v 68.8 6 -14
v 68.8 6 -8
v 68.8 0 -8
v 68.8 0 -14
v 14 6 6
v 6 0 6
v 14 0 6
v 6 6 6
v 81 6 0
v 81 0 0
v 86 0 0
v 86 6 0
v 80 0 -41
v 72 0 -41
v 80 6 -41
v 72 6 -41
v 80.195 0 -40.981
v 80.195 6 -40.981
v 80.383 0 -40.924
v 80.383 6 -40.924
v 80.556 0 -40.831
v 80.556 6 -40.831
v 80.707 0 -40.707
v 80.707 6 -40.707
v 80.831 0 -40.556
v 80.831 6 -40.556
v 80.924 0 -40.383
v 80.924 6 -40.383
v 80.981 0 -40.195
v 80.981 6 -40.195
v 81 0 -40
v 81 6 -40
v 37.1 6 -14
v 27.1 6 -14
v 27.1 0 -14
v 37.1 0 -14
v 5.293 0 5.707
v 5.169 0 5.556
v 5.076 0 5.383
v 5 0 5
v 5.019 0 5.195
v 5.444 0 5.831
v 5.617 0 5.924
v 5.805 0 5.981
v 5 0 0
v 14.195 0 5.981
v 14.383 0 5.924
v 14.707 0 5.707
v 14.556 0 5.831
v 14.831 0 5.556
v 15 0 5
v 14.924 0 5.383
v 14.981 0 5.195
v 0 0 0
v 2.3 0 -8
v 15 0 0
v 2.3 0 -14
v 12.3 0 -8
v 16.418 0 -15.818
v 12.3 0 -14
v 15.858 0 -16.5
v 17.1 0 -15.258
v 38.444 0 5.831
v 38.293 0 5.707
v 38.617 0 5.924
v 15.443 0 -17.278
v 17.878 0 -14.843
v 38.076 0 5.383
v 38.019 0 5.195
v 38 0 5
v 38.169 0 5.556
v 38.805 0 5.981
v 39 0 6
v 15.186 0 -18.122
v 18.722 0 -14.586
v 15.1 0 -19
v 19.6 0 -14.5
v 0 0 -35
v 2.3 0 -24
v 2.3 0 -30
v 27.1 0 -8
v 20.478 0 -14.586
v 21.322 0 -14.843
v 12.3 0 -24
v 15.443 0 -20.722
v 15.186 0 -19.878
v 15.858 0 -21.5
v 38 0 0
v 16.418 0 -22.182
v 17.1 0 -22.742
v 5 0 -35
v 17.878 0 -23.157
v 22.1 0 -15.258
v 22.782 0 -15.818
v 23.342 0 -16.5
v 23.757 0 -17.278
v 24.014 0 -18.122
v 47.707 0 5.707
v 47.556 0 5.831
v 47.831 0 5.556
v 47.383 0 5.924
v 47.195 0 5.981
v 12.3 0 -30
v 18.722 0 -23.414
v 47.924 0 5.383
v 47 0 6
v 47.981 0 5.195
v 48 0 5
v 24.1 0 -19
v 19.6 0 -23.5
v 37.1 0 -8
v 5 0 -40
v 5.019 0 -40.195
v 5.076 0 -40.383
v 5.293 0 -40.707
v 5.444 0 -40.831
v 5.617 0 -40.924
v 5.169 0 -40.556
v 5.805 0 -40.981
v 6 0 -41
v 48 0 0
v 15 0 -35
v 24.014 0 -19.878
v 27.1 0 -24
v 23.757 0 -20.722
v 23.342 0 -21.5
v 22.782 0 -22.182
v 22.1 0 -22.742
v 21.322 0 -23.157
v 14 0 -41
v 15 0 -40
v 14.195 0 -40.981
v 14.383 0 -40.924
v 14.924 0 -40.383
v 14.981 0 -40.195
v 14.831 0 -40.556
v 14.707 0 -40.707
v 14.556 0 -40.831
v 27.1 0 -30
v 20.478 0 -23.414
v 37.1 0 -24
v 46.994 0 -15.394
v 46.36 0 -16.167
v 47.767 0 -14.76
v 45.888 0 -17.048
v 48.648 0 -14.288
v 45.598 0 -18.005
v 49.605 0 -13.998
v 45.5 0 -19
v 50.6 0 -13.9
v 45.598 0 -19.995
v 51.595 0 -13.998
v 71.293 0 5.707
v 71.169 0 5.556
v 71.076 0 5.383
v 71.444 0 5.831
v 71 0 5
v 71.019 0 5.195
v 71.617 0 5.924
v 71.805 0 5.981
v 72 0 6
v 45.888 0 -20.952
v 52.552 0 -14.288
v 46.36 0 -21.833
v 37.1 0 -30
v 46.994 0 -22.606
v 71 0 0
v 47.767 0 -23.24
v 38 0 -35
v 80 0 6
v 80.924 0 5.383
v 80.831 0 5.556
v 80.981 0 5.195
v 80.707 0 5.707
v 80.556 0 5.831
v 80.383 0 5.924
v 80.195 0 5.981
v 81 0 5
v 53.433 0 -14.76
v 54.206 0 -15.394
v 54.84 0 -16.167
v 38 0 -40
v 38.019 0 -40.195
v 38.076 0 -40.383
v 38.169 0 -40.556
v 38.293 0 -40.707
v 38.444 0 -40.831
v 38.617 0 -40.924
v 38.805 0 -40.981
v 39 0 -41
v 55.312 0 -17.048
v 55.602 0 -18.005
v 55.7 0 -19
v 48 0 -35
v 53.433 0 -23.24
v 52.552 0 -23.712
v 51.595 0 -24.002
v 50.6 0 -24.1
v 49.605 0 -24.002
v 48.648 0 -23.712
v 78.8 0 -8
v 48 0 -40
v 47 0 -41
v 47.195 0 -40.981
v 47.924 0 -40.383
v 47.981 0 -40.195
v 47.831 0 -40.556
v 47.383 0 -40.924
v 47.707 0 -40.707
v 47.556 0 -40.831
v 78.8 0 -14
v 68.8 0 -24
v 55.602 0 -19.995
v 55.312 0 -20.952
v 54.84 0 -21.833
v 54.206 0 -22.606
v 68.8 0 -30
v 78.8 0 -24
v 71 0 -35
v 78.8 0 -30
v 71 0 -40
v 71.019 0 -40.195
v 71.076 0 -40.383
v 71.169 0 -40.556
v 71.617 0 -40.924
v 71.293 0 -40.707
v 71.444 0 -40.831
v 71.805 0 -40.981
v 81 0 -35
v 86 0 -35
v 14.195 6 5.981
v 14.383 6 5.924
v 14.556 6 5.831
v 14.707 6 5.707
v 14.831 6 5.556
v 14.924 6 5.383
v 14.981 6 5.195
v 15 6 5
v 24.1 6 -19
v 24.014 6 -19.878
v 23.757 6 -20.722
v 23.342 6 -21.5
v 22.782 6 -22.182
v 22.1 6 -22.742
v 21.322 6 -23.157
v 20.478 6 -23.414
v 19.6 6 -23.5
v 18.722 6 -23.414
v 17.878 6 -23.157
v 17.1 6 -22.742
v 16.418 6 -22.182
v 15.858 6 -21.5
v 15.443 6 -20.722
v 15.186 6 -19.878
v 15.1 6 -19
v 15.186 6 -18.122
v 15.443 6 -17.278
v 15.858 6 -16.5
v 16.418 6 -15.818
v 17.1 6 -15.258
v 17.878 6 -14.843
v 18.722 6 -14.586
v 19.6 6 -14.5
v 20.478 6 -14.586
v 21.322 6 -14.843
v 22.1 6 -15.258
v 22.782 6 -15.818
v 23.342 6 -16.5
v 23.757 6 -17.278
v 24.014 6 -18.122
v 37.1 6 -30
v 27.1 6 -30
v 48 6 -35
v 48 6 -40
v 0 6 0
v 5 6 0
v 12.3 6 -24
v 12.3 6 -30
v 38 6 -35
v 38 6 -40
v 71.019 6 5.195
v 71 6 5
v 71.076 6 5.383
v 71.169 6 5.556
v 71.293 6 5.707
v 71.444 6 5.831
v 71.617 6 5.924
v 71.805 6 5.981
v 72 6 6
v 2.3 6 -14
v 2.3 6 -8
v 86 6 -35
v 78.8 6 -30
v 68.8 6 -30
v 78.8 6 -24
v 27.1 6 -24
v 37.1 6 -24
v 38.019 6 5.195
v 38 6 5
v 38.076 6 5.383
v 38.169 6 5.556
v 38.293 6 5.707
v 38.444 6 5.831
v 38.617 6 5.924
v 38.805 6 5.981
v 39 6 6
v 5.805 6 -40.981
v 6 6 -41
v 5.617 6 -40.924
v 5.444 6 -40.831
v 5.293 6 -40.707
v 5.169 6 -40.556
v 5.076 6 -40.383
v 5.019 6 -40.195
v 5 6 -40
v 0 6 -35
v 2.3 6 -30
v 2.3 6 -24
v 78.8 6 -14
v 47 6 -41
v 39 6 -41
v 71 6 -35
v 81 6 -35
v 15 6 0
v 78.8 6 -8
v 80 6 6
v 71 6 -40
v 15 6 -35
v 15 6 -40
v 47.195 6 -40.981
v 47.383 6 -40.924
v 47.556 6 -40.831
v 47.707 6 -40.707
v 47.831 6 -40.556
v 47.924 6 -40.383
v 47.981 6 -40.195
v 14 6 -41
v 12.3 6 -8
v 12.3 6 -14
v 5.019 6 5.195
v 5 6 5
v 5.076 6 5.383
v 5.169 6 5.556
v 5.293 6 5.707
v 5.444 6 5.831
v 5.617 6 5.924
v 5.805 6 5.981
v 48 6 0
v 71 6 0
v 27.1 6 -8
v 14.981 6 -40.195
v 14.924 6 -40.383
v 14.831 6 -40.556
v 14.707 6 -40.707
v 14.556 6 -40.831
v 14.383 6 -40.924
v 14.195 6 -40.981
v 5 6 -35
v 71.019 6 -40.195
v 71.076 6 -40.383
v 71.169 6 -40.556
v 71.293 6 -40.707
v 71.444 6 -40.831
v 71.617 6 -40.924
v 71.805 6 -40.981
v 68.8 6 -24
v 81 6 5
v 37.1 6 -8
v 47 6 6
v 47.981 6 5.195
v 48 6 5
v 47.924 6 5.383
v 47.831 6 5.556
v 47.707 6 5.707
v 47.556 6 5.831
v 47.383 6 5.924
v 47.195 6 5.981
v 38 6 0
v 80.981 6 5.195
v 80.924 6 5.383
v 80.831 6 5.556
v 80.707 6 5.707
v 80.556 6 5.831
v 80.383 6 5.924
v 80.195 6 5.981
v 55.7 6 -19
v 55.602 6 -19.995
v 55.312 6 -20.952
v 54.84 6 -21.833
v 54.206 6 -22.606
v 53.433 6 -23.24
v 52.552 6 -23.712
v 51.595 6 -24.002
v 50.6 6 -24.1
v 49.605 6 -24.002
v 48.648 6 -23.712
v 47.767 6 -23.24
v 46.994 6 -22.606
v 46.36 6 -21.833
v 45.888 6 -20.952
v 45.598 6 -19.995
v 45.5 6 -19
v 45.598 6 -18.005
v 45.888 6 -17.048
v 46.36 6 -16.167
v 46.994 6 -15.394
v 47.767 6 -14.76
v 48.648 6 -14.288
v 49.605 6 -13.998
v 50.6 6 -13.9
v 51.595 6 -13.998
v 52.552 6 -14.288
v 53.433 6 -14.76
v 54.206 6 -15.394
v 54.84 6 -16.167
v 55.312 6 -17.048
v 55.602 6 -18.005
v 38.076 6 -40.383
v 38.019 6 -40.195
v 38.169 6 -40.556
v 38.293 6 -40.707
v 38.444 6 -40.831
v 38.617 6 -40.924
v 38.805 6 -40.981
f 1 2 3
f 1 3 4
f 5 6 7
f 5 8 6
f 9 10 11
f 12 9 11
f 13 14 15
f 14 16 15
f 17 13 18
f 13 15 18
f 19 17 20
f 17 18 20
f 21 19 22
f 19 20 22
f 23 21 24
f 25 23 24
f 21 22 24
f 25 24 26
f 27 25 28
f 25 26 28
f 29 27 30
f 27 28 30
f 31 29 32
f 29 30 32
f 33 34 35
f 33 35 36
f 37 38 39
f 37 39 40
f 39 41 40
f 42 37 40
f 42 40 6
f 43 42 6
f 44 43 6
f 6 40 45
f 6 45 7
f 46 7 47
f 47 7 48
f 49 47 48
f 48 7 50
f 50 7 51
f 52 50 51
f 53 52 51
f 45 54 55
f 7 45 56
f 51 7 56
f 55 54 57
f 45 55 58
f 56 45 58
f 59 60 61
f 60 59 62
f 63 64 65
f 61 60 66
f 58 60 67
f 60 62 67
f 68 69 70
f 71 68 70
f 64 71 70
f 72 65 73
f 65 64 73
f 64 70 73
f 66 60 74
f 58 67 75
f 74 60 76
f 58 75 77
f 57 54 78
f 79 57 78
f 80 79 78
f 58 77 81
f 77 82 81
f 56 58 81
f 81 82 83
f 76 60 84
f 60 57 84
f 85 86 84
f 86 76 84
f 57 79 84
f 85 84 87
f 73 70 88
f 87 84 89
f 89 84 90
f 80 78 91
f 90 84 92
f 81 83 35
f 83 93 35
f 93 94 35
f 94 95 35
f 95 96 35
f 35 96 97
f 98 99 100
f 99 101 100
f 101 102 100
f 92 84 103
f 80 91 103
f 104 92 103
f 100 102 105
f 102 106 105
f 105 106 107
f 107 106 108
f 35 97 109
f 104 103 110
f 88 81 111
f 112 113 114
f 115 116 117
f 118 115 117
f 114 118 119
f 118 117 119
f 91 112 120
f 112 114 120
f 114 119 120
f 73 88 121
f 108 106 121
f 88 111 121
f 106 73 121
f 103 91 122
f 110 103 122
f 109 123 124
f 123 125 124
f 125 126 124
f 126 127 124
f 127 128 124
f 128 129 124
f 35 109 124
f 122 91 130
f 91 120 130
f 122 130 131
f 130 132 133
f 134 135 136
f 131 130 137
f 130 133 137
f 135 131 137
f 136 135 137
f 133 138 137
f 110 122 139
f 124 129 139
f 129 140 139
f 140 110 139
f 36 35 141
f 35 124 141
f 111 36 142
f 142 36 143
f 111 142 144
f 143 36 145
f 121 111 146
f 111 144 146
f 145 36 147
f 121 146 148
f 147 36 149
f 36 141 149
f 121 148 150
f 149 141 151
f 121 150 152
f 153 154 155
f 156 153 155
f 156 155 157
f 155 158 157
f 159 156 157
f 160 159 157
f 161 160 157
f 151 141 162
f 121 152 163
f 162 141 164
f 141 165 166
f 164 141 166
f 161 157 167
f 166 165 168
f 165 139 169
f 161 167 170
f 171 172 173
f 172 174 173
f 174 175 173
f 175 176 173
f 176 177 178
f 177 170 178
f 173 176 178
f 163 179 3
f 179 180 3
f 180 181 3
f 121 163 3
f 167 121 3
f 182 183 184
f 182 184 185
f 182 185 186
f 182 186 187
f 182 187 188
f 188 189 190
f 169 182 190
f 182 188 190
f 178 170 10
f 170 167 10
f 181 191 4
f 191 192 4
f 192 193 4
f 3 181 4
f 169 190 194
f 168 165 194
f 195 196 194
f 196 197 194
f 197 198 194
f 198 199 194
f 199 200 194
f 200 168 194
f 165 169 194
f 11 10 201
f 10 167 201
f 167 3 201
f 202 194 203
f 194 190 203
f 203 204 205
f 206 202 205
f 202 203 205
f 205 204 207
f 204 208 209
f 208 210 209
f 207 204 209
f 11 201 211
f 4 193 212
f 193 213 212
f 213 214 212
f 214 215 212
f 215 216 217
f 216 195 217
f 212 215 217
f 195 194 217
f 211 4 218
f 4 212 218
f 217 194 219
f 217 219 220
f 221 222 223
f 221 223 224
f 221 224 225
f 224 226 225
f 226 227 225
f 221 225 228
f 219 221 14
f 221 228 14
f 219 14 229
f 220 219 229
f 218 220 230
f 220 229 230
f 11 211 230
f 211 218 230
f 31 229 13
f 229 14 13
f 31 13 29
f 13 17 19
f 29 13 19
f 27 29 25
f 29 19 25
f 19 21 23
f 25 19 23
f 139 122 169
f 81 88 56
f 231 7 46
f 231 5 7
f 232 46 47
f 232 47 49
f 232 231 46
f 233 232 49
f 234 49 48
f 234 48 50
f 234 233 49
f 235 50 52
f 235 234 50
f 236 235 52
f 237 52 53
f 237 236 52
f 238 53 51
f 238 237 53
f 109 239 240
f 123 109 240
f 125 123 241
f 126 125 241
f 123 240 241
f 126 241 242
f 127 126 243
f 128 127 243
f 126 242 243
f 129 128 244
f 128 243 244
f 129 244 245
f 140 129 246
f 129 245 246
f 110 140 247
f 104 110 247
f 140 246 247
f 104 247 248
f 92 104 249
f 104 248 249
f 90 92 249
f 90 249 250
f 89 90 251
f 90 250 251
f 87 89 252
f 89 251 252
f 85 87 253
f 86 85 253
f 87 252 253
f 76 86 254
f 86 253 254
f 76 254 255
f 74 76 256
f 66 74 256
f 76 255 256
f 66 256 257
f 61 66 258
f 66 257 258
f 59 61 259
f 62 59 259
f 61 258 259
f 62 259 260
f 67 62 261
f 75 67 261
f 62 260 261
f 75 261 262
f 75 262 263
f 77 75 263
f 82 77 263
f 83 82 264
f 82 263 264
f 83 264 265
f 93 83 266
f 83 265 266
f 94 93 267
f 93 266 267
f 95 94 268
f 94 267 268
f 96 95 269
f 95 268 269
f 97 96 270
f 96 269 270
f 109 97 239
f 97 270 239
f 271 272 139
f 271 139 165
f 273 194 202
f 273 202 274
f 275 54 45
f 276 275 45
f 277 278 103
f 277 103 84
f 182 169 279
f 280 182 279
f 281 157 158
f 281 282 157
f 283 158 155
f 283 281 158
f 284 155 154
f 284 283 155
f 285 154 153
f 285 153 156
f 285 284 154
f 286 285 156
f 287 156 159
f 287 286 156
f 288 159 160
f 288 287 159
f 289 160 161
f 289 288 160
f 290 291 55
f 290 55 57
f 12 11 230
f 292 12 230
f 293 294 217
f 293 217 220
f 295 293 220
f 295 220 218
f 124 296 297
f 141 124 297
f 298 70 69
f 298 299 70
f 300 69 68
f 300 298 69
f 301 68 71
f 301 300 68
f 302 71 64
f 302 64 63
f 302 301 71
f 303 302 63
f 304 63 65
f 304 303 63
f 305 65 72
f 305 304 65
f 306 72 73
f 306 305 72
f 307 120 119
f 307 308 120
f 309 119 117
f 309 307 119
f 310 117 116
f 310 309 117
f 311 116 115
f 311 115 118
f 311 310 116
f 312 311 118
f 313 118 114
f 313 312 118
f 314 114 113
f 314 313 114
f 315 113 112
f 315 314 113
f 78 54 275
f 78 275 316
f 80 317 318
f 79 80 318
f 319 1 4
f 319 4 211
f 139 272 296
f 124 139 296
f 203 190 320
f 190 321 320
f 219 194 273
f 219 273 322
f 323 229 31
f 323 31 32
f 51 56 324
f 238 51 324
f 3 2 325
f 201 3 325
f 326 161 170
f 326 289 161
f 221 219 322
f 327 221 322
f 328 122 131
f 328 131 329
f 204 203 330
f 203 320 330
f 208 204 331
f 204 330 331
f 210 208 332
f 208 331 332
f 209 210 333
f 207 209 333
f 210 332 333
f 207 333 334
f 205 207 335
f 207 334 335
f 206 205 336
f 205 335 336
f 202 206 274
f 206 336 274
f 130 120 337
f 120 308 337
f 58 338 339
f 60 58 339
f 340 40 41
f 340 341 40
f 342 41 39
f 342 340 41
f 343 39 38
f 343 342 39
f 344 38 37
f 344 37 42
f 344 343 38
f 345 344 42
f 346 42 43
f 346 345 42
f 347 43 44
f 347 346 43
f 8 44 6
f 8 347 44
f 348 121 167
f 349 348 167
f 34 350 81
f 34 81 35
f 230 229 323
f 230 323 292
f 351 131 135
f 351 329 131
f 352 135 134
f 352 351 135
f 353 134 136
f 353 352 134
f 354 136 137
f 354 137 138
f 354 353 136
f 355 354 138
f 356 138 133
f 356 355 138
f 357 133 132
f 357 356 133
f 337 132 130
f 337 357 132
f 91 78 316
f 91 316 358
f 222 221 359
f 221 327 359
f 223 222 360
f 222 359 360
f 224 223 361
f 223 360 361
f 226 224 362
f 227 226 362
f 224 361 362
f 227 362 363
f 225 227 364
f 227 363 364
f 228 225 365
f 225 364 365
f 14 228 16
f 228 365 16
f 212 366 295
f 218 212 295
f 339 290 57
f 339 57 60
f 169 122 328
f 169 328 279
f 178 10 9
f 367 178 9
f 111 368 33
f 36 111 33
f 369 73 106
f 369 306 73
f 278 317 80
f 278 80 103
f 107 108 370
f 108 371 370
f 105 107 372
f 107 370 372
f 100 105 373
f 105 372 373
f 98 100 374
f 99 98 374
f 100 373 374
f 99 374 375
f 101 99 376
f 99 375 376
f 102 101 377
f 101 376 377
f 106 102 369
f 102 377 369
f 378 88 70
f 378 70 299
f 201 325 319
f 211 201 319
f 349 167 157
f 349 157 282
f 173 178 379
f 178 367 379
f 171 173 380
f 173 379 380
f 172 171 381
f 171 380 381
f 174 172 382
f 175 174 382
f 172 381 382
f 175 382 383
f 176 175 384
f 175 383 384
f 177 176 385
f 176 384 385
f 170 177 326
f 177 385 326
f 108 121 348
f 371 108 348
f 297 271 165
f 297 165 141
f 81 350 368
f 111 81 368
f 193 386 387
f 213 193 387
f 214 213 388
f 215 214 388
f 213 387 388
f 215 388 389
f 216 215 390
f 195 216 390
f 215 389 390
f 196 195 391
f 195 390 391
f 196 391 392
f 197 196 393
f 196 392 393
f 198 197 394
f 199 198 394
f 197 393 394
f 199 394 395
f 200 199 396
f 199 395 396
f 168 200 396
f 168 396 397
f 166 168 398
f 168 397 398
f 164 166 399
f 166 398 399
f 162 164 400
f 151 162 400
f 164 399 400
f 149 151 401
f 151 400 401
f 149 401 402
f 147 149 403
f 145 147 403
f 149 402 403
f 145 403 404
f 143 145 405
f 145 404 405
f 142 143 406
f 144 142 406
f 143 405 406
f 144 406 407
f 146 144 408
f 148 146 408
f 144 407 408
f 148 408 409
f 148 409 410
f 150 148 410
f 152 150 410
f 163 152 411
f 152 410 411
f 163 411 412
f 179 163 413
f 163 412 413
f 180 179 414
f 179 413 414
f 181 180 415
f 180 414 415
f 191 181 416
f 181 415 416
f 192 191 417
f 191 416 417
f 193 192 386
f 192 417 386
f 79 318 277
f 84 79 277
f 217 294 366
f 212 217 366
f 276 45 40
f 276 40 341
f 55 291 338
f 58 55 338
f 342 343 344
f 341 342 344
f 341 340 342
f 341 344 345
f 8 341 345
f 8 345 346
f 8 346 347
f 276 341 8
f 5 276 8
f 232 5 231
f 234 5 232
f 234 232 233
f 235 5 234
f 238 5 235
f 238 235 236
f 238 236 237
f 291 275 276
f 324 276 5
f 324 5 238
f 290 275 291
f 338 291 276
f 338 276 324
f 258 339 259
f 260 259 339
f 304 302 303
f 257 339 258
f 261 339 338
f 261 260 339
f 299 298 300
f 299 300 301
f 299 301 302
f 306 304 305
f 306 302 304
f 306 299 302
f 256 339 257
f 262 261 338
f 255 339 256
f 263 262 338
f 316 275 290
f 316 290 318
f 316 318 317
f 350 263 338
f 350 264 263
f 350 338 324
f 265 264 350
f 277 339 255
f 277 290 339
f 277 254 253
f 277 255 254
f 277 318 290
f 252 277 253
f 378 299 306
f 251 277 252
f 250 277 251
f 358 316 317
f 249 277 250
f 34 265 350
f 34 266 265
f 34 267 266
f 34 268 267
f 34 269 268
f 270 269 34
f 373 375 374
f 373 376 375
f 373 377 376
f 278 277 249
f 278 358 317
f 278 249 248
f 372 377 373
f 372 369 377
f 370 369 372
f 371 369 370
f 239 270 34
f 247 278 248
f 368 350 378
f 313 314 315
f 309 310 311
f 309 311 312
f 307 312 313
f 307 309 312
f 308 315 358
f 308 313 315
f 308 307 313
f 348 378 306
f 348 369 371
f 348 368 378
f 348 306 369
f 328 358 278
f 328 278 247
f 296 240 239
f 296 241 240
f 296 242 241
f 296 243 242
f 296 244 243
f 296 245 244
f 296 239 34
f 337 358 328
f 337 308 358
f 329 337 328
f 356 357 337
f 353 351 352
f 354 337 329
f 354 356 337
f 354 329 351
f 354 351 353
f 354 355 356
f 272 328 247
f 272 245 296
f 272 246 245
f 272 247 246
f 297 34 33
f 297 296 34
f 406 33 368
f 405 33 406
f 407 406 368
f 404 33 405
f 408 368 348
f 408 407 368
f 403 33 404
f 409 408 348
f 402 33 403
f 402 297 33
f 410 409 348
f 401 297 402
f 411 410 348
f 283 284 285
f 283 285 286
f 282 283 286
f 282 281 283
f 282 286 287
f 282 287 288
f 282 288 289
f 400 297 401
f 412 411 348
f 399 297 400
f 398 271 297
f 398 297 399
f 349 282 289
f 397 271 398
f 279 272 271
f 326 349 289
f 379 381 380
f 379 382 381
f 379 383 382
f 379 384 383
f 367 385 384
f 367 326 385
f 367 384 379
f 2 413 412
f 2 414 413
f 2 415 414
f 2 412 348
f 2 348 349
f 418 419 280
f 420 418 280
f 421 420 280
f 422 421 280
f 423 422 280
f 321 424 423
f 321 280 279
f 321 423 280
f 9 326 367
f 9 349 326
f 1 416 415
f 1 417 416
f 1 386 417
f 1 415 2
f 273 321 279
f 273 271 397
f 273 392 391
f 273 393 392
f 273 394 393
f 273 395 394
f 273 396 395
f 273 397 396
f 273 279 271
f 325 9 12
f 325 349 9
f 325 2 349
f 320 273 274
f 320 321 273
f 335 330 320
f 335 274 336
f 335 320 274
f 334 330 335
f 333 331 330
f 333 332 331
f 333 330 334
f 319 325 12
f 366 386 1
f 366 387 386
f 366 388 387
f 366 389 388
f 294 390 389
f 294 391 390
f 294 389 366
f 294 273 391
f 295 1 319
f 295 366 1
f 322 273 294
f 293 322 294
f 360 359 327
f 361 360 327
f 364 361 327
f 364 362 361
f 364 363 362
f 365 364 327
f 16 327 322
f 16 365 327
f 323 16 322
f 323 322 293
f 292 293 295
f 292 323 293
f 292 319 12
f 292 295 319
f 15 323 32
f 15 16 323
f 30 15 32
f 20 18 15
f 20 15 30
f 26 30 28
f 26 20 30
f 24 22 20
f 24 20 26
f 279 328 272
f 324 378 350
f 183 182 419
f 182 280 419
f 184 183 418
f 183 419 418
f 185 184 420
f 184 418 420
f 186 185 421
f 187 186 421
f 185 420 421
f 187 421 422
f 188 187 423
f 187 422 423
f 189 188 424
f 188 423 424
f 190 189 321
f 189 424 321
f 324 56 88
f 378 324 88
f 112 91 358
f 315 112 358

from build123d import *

# Parameters (mm, degrees)
SKETCH1_W               = 86
SKETCH1_H               = 35
BOSS_EXTRUDE1_DEPTH     = 6
SKETCH2_R               = 5.1
SKETCH2_R_2             = 4.5
CUT_EXTRUDE1_DEPTH      = 6
SKETCH234_W             = 10
SKETCH234_H             = 6
BOSS_EXTRUDE234_DEPTH   = 6
FILLET134_R             = 1
SKETCH2341_W            = 10
SKETCH2341_H            = 6
BOSS_EXTRUDE2341_DEPTH  = 6
FILLET1341_R            = 1
SKETCH2342_W            = 10
SKETCH2342_H            = 6
BOSS_EXTRUDE2342_DEPTH  = 6
FILLET1342_R            = 1
FILLET134_OF_MIRROR1_R  = 1
FILLET1341_OF_MIRROR1_R = 1
FILLET1342_OF_MIRROR1_R = 1
SKETCH6_W               = 10
SKETCH6_H               = 6
CUT_EXTRUDE11_DEPTH     = 4
SKETCH61_W              = 10
SKETCH61_H              = 6
CUT_EXTRUDE12_DEPTH     = 4
SKETCH62_W              = 10
SKETCH62_H              = 6
CUT_EXTRUDE13_DEPTH     = 4


with BuildPart() as part:
    # Sketch1 → Boss-Extrude1 (new body)
    with BuildSketch(Plane(origin=(0, 0, 0), x_dir=(1, 0, 0), z_dir=(0, 1, 0))):
        with Locations((43, 17.5)):
            Rectangle(SKETCH1_W, SKETCH1_H)
    extrude(amount=BOSS_EXTRUDE1_DEPTH)

    # Sketch2 → Cut-Extrude1 (cut)
    with BuildSketch(Plane(origin=(0, 6, 0), x_dir=(1, 0, 0), z_dir=(0, 1, 0))):
        with Locations((50.6, 19)):
            Circle(SKETCH2_R)
        with Locations((19.6, 19)):
            Circle(SKETCH2_R_2)
    extrude(amount=-CUT_EXTRUDE1_DEPTH, mode=Mode.SUBTRACT)

    # Sketch234 → Boss-Extrude234 (add)
    with BuildSketch(Plane(origin=(9.232221392, 0, 0), x_dir=(1, 0, 0), z_dir=(0, 0, 1))):
        with Locations((0.767778608, 3)):
            Rectangle(SKETCH234_W, SKETCH234_H)
    boss_extrude234 = extrude(amount=BOSS_EXTRUDE234_DEPTH)

    # Fillet134
    fillet134_edges = [part.edges().sort_by_distance(p)[0] for p in [
        (5, 3, 6),
        (15, 3, 6),
    ]]
    fillet(fillet134_edges, radius=FILLET134_R)

    # Sketch2341 → Boss-Extrude2341 (add)
    with BuildSketch(Plane(origin=(42.232221392, 0, 0), x_dir=(1, 0, 0), z_dir=(0, 0, 1))):
        with Locations((0.767778608, 3)):
            Rectangle(SKETCH2341_W, SKETCH2341_H)
    boss_extrude2341 = extrude(amount=BOSS_EXTRUDE2341_DEPTH)

    # Fillet1341
    fillet1341_edges = [part.edges().sort_by_distance(p)[0] for p in [
        (48, 3, 6),
        (38, 3, 6),
    ]]
    fillet(fillet1341_edges, radius=FILLET1341_R)

    # Sketch2342 → Boss-Extrude2342 (add)
    with BuildSketch(Plane(origin=(75.232221392, 0, 0), x_dir=(1, 0, 0), z_dir=(0, 0, 1))):
        with Locations((0.767778608, 3)):
            Rectangle(SKETCH2342_W, SKETCH2342_H)
    boss_extrude2342 = extrude(amount=BOSS_EXTRUDE2342_DEPTH)

    # Fillet1342
    fillet1342_edges = [part.edges().sort_by_distance(p)[0] for p in [
        (81, 3, 6),
        (71, 3, 6),
    ]]
    fillet(fillet1342_edges, radius=FILLET1342_R)

    # Mirror1: Boss-Extrude234, Boss-Extrude2341, Boss-Extrude2342 across plane
    add(boss_extrude234.mirror(Plane(origin=(0, 0, -17.5), x_dir=(1, 0, 0), z_dir=(0, 0, -1))))
    add(boss_extrude2341.mirror(Plane(origin=(0, 0, -17.5), x_dir=(1, 0, 0), z_dir=(0, 0, -1))))
    add(boss_extrude2342.mirror(Plane(origin=(0, 0, -17.5), x_dir=(1, 0, 0), z_dir=(0, 0, -1))))

    # Fillet134 of Mirror1
    fillet134_of_mirror1_edges = [part.edges().sort_by_distance(p)[0] for p in [
        (5, 3, -41),
        (15, 3, -41),
    ]]
    fillet(fillet134_of_mirror1_edges, radius=FILLET134_OF_MIRROR1_R)

    # Fillet1341 of Mirror1
    fillet1341_of_mirror1_edges = [part.edges().sort_by_distance(p)[0] for p in [
        (48, 3, -41),
        (38, 3, -41),
    ]]
    fillet(fillet1341_of_mirror1_edges, radius=FILLET1341_OF_MIRROR1_R)

    # Fillet1342 of Mirror1
    fillet1342_of_mirror1_edges = [part.edges().sort_by_distance(p)[0] for p in [
        (81, 3, -41),
        (71, 3, -41),
    ]]
    fillet(fillet1342_of_mirror1_edges, radius=FILLET1342_OF_MIRROR1_R)

    # Sketch6 → Cut-Extrude11 (cut, symmetric)
    with BuildSketch(Plane(origin=(73.032221392, 3, -55), x_dir=(1, 0, 0), z_dir=(0, 1, 0))):
        with Locations((0.767778608, -44)):
            Rectangle(SKETCH6_W, SKETCH6_H)
    cut_extrude11 = extrude(amount=CUT_EXTRUDE11_DEPTH, both=True, mode=Mode.SUBTRACT)

    # Sketch61 → Cut-Extrude12 (cut, symmetric)
    with BuildSketch(Plane(origin=(31.332221392, 3, -55), x_dir=(1, 0, 0), z_dir=(0, 1, 0))):
        with Locations((0.767778608, -44)):
            Rectangle(SKETCH61_W, SKETCH61_H)
    cut_extrude12 = extrude(amount=CUT_EXTRUDE12_DEPTH, both=True, mode=Mode.SUBTRACT)

    # Sketch62 → Cut-Extrude13 (cut, symmetric)
    with BuildSketch(Plane(origin=(6.532221392, 3, -55), x_dir=(1, 0, 0), z_dir=(0, 1, 0))):
        with Locations((0.767778608, -44)):
            Rectangle(SKETCH62_W, SKETCH62_H)
    cut_extrude13 = extrude(amount=CUT_EXTRUDE13_DEPTH, both=True, mode=Mode.SUBTRACT)

    # Mirror2: Cut-Extrude11, Cut-Extrude12, Cut-Extrude13 across plane
    add(cut_extrude11.mirror(Plane(origin=(0, 0, -19), x_dir=(1, 0, 0), z_dir=(0, 0, -1))), mode=Mode.SUBTRACT)
    add(cut_extrude12.mirror(Plane(origin=(0, 0, -19), x_dir=(1, 0, 0), z_dir=(0, 0, -1))), mode=Mode.SUBTRACT)
    add(cut_extrude13.mirror(Plane(origin=(0, 0, -19), x_dir=(1, 0, 0), z_dir=(0, 0, -1))), mode=Mode.SUBTRACT)


solid = part.part
